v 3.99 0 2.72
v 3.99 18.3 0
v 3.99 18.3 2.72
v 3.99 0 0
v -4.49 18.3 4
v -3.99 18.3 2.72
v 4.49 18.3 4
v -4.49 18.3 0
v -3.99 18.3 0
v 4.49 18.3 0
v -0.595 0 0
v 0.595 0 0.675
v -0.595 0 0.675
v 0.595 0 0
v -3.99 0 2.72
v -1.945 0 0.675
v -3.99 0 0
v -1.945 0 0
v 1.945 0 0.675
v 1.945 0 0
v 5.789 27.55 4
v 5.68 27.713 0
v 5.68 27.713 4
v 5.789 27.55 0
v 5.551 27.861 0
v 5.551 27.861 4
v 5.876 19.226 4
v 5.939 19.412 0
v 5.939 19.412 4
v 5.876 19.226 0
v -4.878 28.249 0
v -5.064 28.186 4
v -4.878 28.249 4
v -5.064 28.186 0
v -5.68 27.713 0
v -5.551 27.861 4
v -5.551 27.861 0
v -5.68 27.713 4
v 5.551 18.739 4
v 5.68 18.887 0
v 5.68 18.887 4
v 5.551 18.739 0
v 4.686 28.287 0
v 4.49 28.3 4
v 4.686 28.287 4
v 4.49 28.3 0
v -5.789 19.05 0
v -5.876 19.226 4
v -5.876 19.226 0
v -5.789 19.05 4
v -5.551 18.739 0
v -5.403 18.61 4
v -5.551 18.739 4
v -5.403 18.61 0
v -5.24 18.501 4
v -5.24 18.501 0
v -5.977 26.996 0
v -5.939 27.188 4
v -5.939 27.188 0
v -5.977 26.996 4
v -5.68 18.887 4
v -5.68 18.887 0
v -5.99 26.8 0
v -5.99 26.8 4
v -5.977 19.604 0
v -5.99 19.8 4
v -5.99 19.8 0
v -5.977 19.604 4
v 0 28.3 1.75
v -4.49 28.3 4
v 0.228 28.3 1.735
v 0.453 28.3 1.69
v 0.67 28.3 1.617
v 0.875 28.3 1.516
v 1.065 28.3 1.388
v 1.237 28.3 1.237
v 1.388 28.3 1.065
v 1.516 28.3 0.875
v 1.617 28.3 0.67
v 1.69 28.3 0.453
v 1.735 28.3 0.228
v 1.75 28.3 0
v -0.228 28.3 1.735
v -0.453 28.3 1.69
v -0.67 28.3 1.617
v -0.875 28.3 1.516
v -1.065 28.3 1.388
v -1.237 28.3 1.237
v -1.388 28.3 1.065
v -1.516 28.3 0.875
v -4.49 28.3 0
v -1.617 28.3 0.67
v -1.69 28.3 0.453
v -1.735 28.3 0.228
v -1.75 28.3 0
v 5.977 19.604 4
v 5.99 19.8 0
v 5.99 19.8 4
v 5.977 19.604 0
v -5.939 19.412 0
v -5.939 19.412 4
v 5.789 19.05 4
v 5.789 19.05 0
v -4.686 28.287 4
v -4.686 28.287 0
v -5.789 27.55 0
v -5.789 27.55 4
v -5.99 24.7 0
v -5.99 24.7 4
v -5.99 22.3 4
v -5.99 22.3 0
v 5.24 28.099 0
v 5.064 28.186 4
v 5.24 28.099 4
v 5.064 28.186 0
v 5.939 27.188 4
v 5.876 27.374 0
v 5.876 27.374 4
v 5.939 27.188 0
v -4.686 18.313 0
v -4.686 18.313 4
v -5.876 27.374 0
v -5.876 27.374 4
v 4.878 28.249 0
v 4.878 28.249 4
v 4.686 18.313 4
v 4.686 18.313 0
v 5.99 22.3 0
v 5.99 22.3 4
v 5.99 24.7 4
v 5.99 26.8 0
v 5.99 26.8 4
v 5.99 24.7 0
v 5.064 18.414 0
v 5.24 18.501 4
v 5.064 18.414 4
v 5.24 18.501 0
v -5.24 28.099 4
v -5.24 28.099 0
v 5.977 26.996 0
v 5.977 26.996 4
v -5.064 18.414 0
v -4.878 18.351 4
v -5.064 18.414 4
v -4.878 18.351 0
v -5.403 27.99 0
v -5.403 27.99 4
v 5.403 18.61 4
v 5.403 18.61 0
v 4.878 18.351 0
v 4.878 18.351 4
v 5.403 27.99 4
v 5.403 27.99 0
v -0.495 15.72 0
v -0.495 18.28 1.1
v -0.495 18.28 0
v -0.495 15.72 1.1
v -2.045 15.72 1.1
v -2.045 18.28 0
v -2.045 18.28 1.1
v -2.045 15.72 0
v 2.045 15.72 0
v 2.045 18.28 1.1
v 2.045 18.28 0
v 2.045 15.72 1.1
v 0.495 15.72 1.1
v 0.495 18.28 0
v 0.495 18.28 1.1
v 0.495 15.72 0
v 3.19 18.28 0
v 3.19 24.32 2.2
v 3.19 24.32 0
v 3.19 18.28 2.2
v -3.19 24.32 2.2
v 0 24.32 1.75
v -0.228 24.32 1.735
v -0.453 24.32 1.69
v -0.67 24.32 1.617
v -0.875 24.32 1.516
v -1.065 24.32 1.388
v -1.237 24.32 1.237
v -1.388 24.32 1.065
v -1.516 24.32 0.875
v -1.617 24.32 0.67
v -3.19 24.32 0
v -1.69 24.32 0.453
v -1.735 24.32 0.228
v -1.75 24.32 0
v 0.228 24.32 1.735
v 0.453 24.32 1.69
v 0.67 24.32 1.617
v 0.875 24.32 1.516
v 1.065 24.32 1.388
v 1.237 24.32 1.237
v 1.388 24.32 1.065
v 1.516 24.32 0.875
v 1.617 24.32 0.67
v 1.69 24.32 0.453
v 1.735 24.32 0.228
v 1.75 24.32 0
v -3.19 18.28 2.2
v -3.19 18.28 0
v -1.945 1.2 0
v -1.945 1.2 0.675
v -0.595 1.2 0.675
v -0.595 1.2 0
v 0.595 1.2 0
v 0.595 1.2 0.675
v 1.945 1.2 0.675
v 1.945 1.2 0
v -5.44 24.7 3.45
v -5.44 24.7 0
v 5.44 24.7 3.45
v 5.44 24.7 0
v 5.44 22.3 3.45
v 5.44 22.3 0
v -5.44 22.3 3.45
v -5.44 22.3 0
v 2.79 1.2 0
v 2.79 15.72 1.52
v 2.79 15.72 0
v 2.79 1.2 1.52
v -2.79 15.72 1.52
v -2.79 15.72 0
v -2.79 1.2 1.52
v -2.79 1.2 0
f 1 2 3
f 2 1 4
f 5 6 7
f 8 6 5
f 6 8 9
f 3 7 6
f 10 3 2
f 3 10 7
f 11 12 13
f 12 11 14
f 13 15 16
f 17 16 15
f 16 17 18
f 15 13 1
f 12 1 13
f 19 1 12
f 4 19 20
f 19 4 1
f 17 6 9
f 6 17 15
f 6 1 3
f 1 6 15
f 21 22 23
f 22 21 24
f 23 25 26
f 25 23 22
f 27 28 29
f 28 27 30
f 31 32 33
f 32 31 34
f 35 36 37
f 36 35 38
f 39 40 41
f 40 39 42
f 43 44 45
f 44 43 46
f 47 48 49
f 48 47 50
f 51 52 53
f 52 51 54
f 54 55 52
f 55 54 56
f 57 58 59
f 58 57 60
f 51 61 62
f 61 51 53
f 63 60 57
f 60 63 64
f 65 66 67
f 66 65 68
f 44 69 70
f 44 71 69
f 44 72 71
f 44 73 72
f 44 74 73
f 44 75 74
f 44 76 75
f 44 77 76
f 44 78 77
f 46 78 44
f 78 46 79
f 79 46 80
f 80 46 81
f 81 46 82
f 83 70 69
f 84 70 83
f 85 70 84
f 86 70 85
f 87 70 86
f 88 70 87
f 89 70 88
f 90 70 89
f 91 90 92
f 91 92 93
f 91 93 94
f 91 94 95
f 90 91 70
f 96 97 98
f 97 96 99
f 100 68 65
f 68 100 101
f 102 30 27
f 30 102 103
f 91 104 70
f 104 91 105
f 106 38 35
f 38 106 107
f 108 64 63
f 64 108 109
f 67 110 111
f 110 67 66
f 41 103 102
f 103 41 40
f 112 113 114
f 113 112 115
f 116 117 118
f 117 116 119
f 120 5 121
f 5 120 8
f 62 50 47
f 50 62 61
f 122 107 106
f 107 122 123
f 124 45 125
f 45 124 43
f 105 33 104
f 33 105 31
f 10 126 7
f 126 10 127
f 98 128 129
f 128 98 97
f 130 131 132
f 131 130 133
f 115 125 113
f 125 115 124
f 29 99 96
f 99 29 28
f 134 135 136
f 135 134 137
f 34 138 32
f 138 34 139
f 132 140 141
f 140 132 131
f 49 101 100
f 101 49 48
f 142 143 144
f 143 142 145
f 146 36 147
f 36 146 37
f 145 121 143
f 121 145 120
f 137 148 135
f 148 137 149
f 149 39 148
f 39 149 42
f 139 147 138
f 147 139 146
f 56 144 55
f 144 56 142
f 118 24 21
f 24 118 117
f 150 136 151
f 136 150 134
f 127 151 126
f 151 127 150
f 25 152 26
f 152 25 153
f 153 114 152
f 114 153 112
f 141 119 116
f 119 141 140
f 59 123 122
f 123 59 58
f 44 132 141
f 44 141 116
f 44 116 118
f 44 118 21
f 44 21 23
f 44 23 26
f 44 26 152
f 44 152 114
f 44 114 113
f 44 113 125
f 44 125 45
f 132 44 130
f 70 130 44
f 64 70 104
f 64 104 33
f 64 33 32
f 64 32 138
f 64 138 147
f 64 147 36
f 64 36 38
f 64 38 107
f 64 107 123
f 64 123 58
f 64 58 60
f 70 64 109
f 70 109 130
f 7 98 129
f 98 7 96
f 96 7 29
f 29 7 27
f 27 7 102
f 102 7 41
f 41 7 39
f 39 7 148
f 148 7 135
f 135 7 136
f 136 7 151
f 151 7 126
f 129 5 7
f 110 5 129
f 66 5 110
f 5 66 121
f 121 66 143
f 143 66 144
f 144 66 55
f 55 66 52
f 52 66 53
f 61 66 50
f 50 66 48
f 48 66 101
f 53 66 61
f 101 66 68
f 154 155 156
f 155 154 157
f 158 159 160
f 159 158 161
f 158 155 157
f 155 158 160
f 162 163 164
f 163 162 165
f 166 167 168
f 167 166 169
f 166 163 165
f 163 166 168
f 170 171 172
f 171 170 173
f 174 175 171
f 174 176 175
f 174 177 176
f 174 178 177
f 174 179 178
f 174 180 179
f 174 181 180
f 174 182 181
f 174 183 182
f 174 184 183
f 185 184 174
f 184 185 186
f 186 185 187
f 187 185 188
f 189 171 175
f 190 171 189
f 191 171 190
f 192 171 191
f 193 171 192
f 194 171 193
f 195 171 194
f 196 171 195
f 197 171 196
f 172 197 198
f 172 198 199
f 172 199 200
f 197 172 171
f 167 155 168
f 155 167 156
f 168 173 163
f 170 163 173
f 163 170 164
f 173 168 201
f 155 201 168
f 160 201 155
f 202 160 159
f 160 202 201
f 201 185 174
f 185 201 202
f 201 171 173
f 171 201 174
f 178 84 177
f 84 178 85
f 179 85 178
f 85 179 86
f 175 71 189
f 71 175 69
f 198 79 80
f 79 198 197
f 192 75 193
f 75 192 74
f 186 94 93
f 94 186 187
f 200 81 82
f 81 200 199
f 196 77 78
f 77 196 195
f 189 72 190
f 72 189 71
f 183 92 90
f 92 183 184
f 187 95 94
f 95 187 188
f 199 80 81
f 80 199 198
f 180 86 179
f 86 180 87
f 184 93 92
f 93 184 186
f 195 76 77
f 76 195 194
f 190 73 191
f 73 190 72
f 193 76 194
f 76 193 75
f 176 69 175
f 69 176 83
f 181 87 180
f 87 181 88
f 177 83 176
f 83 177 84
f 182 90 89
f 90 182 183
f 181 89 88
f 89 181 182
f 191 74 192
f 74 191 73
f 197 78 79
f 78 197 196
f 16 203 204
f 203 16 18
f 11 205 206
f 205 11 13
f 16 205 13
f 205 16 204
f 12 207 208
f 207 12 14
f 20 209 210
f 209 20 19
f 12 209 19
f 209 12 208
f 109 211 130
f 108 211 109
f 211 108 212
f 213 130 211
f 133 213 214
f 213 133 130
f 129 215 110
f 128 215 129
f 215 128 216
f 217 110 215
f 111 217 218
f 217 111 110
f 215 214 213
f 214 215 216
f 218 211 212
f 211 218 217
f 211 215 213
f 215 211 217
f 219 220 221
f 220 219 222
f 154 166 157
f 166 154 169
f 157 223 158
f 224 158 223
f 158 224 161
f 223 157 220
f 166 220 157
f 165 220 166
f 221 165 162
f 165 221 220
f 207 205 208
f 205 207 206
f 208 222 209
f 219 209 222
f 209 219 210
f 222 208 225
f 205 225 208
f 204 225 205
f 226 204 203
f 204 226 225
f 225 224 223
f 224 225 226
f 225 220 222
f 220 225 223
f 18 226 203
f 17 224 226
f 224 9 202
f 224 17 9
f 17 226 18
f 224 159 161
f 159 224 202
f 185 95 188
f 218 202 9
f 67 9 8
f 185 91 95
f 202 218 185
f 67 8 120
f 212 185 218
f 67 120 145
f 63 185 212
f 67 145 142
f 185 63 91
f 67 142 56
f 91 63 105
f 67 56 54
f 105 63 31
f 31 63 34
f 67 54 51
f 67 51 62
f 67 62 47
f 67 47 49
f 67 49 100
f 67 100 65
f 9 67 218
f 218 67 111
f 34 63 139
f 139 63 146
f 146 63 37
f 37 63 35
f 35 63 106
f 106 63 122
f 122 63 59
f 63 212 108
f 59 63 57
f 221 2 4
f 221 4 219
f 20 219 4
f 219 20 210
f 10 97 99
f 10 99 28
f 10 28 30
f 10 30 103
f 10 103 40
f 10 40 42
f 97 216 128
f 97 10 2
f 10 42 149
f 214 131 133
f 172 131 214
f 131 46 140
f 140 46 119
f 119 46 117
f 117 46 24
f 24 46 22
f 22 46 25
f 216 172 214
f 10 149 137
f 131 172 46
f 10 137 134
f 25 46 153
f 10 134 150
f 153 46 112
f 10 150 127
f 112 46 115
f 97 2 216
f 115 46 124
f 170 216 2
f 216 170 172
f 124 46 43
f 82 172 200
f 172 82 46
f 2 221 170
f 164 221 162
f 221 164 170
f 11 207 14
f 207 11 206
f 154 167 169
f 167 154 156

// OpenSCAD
// Perfboard-side 1x2 / 1x4 holder for individual MALE Dupont jumper ends.
// Matching keyed collar surrounds a soldered FEMALE header on the perfboard.
// Fit prototype only: verify the real jumper housings and pin engagement.
// All dimensions in millimetres.

$fn = 48;

contacts = 2; // [2,4]
part = "plug_lower"; // [plug_lower,plug_upper,board_collar,assembly,exploded]

pitch = 2.54;
pin_aperture = 1.35;
front_lip = 1.20;

// Generic 1P Dupont housing dimensions, NOT verified for the purchased wires.
single_x = 2.54;
single_y = 2.54;
single_z = 14.00;
pack_fit_x = 0.50;
pack_fit_y = 0.50;
pack_fit_z = 0.50;

body_x = contacts*single_x + pack_fit_x;
body_y = single_y + pack_fit_y;
nose_x = body_x + 2.40;
nose_y = body_y + 2.40;
rear_stop = 2.60;
nose_z = front_lip + single_z + pack_fit_z + rear_stop;

rear_x = nose_x + 4.00;
rear_y = 8.00;
rear_z = 10.00;
total_z = nose_z + rear_z;
rear_corner_r = 1.50;

wire_slot_x = 1.55;
wire_slot_y = 2.20;
rear_chamber_x = body_x + 0.80;
rear_chamber_y = 4.40;
rear_chamber_z = 6.00;
cable_exit_d = contacts == 2 ? 3.50 : 5.20;

tie_groove_depth = 0.55;
tie_groove_width = 2.40;
tie_z = nose_z + 4.00;

// Optional two-M3 clamp revision. The screws pass through the rear body,
// outside the cable exit, so both halves remain joined when unplugged.
clamp_screws = false;
clamp_hole_d = 3.25;
clamp_boss_r = 2.80;
clamp_x = rear_x/2-1.60;
clamp_z = nose_z+7.50;

key_width = 1.40;
key_projection = 1.10;
key_x = contacts == 2 ? 0 : pitch;
key_side = contacts == 2 ? 1 : -1;
collar_clearance = 0.55;
collar_wall = 2.00;
collar_h = 7.50;
pin1_mark_d = 1.20;
pin1_mark_depth = 0.50;

epsilon = 0.02;

assert(contacts == 2 || contacts == 4);
assert(pin_aperture < pitch);

function contact_x(i) = (i-(contacts-1)/2)*pitch;

module pin_pattern(h=front_lip) {
    for (i = [0:contacts-1])
        translate([contact_x(i), 0, -epsilon])
            linear_extrude(height=h+2*epsilon)
                square([pin_aperture, pin_aperture], center=true);
}

module key_rib() {
    translate([key_x-key_width/2,
               key_side > 0 ? nose_y/2 : -nose_y/2-key_projection,
               0])
        cube([key_width, key_projection, nose_z]);
}

module rounded_rear() {
    hull()
        for (x = [-rear_x/2+rear_corner_r,
                   rear_x/2-rear_corner_r],
             z = [nose_z+rear_corner_r,
                  total_z-rear_corner_r])
            translate([x, 0, z])
                rotate([-90, 0, 0])
                    cylinder(r=rear_corner_r, h=rear_y, center=true);
}

module outer_plug() {
    union() {
        translate([-nose_x/2, -nose_y/2, 0])
            cube([nose_x, nose_y, nose_z]);
        key_rib();
        rounded_rear();
        if (clamp_screws)
            for (x=[-clamp_x,clamp_x])
                translate([x,0,clamp_z])
                    rotate([-90,0,0])
                        cylinder(r=clamp_boss_r,h=rear_y,center=true);
    }
}

module clamp_holes() {
    for (x=[-clamp_x,clamp_x])
        translate([x,-rear_y/2-epsilon,clamp_z])
            rotate([-90,0,0])
                cylinder(d=clamp_hole_d,h=rear_y+2*epsilon);
}

module body_pocket() {
    translate([-body_x/2, -body_y/2, front_lip])
        cube([body_x, body_y,
              single_z+pack_fit_z+epsilon]);
}

module wire_comb() {
    // Both half-channels open at the y=0 split so a preterminated cable can
    // be laid in place without threading its other end through a small hole.
    for (i = [0:contacts-1])
        translate([contact_x(i)-wire_slot_x/2, -wire_slot_y/2,
                   front_lip+single_z+pack_fit_z-epsilon])
            cube([wire_slot_x, wire_slot_y,
                  rear_stop+2*epsilon]);
}

module rear_cable_space() {
    translate([-rear_chamber_x/2, -rear_chamber_y/2,
               nose_z-epsilon])
        cube([rear_chamber_x, rear_chamber_y,
              rear_chamber_z+2*epsilon]);
    translate([0, 0, nose_z+rear_chamber_z-epsilon])
        cylinder(d=cable_exit_d,
                 h=rear_z-rear_chamber_z+2*epsilon);
}

module tie_groove() {
    // Shallow external groove for one small cable tie across both halves.
    difference() {
        translate([-rear_x, -rear_y, tie_z])
            cube([2*rear_x, 2*rear_y, tie_groove_width]);
        translate([-rear_x/2+tie_groove_depth,
                   -rear_y/2+tie_groove_depth,
                   tie_z-epsilon])
            cube([rear_x-2*tie_groove_depth,
                  rear_y-2*tie_groove_depth,
                  tie_groove_width+2*epsilon]);
    }
}

module pin1_mark() {
    // Recessed dot over x-negative contact 1, on the y-positive half.
    translate([contact_x(0), nose_y/2+epsilon, nose_z/2])
        rotate([90, 0, 0])
            cylinder(d=pin1_mark_d, h=pin1_mark_depth+2*epsilon);
}

module whole_plug() {
    difference() {
        outer_plug();
        body_pocket();
        wire_comb();
        rear_cable_space();
        pin_pattern();
        if (clamp_screws) clamp_holes();
        else tie_groove();
        pin1_mark();
    }
}

module lower_half() {
    intersection() {
        whole_plug();
        translate([-rear_x, -rear_y, -epsilon])
            cube([2*rear_x, rear_y, total_z+2*epsilon]);
    }
}

module upper_half() {
    intersection() {
        whole_plug();
        translate([-rear_x, 0, -epsilon])
            cube([2*rear_x, rear_y, total_z+2*epsilon]);
    }
}

module keyed_opening(h) {
    inner_x = nose_x+collar_clearance;
    inner_y = nose_y+collar_clearance;
    translate([-inner_x/2, -inner_y/2, -epsilon])
        cube([inner_x, inner_y, h+2*epsilon]);
    slot_x = key_width+collar_clearance;
    translate([key_x-slot_x/2,
               key_side > 0 ? nose_y/2 :
                              -nose_y/2-key_projection-collar_clearance/2,
               -epsilon])
        cube([slot_x, key_projection+collar_clearance/2,
              h+2*epsilon]);
}

module board_collar() {
    outer_x = nose_x+collar_clearance+2*collar_wall;
    outer_y = nose_y+collar_clearance+2*collar_wall;
    difference() {
        translate([-outer_x/2, -outer_y/2, 0])
            cube([outer_x, outer_y, collar_h]);
        keyed_opening(collar_h);
    }
}

module mockup_ends() {
    for (i = [0:contacts-1])
        color([0.12, 0.12, 0.12, 0.5])
            translate([contact_x(i)-single_x/2,
                       -single_y/2, front_lip])
                cube([single_x, single_y, single_z]);
}

if (part == "plug_lower") rotate([-90, 0, 0]) lower_half();
else if (part == "plug_upper") rotate([90, 0, 0]) upper_half();
else if (part == "board_collar") board_collar();
else if (part == "assembly") {
    lower_half();
    color([0.40, 0.75, 0.85, 0.45]) upper_half();
    mockup_ends();
} else if (part == "exploded") {
    color([0.40, 0.75, 0.85]) translate([0, 4.0, 12]) upper_half();
    color([0.45, 0.70, 0.45]) translate([0, -4.0, 12]) lower_half();
    color([0.95, 0.55, 0.22]) board_collar();
    mockup_ends();
} else assert(false, str("Unknown part: ", part));
